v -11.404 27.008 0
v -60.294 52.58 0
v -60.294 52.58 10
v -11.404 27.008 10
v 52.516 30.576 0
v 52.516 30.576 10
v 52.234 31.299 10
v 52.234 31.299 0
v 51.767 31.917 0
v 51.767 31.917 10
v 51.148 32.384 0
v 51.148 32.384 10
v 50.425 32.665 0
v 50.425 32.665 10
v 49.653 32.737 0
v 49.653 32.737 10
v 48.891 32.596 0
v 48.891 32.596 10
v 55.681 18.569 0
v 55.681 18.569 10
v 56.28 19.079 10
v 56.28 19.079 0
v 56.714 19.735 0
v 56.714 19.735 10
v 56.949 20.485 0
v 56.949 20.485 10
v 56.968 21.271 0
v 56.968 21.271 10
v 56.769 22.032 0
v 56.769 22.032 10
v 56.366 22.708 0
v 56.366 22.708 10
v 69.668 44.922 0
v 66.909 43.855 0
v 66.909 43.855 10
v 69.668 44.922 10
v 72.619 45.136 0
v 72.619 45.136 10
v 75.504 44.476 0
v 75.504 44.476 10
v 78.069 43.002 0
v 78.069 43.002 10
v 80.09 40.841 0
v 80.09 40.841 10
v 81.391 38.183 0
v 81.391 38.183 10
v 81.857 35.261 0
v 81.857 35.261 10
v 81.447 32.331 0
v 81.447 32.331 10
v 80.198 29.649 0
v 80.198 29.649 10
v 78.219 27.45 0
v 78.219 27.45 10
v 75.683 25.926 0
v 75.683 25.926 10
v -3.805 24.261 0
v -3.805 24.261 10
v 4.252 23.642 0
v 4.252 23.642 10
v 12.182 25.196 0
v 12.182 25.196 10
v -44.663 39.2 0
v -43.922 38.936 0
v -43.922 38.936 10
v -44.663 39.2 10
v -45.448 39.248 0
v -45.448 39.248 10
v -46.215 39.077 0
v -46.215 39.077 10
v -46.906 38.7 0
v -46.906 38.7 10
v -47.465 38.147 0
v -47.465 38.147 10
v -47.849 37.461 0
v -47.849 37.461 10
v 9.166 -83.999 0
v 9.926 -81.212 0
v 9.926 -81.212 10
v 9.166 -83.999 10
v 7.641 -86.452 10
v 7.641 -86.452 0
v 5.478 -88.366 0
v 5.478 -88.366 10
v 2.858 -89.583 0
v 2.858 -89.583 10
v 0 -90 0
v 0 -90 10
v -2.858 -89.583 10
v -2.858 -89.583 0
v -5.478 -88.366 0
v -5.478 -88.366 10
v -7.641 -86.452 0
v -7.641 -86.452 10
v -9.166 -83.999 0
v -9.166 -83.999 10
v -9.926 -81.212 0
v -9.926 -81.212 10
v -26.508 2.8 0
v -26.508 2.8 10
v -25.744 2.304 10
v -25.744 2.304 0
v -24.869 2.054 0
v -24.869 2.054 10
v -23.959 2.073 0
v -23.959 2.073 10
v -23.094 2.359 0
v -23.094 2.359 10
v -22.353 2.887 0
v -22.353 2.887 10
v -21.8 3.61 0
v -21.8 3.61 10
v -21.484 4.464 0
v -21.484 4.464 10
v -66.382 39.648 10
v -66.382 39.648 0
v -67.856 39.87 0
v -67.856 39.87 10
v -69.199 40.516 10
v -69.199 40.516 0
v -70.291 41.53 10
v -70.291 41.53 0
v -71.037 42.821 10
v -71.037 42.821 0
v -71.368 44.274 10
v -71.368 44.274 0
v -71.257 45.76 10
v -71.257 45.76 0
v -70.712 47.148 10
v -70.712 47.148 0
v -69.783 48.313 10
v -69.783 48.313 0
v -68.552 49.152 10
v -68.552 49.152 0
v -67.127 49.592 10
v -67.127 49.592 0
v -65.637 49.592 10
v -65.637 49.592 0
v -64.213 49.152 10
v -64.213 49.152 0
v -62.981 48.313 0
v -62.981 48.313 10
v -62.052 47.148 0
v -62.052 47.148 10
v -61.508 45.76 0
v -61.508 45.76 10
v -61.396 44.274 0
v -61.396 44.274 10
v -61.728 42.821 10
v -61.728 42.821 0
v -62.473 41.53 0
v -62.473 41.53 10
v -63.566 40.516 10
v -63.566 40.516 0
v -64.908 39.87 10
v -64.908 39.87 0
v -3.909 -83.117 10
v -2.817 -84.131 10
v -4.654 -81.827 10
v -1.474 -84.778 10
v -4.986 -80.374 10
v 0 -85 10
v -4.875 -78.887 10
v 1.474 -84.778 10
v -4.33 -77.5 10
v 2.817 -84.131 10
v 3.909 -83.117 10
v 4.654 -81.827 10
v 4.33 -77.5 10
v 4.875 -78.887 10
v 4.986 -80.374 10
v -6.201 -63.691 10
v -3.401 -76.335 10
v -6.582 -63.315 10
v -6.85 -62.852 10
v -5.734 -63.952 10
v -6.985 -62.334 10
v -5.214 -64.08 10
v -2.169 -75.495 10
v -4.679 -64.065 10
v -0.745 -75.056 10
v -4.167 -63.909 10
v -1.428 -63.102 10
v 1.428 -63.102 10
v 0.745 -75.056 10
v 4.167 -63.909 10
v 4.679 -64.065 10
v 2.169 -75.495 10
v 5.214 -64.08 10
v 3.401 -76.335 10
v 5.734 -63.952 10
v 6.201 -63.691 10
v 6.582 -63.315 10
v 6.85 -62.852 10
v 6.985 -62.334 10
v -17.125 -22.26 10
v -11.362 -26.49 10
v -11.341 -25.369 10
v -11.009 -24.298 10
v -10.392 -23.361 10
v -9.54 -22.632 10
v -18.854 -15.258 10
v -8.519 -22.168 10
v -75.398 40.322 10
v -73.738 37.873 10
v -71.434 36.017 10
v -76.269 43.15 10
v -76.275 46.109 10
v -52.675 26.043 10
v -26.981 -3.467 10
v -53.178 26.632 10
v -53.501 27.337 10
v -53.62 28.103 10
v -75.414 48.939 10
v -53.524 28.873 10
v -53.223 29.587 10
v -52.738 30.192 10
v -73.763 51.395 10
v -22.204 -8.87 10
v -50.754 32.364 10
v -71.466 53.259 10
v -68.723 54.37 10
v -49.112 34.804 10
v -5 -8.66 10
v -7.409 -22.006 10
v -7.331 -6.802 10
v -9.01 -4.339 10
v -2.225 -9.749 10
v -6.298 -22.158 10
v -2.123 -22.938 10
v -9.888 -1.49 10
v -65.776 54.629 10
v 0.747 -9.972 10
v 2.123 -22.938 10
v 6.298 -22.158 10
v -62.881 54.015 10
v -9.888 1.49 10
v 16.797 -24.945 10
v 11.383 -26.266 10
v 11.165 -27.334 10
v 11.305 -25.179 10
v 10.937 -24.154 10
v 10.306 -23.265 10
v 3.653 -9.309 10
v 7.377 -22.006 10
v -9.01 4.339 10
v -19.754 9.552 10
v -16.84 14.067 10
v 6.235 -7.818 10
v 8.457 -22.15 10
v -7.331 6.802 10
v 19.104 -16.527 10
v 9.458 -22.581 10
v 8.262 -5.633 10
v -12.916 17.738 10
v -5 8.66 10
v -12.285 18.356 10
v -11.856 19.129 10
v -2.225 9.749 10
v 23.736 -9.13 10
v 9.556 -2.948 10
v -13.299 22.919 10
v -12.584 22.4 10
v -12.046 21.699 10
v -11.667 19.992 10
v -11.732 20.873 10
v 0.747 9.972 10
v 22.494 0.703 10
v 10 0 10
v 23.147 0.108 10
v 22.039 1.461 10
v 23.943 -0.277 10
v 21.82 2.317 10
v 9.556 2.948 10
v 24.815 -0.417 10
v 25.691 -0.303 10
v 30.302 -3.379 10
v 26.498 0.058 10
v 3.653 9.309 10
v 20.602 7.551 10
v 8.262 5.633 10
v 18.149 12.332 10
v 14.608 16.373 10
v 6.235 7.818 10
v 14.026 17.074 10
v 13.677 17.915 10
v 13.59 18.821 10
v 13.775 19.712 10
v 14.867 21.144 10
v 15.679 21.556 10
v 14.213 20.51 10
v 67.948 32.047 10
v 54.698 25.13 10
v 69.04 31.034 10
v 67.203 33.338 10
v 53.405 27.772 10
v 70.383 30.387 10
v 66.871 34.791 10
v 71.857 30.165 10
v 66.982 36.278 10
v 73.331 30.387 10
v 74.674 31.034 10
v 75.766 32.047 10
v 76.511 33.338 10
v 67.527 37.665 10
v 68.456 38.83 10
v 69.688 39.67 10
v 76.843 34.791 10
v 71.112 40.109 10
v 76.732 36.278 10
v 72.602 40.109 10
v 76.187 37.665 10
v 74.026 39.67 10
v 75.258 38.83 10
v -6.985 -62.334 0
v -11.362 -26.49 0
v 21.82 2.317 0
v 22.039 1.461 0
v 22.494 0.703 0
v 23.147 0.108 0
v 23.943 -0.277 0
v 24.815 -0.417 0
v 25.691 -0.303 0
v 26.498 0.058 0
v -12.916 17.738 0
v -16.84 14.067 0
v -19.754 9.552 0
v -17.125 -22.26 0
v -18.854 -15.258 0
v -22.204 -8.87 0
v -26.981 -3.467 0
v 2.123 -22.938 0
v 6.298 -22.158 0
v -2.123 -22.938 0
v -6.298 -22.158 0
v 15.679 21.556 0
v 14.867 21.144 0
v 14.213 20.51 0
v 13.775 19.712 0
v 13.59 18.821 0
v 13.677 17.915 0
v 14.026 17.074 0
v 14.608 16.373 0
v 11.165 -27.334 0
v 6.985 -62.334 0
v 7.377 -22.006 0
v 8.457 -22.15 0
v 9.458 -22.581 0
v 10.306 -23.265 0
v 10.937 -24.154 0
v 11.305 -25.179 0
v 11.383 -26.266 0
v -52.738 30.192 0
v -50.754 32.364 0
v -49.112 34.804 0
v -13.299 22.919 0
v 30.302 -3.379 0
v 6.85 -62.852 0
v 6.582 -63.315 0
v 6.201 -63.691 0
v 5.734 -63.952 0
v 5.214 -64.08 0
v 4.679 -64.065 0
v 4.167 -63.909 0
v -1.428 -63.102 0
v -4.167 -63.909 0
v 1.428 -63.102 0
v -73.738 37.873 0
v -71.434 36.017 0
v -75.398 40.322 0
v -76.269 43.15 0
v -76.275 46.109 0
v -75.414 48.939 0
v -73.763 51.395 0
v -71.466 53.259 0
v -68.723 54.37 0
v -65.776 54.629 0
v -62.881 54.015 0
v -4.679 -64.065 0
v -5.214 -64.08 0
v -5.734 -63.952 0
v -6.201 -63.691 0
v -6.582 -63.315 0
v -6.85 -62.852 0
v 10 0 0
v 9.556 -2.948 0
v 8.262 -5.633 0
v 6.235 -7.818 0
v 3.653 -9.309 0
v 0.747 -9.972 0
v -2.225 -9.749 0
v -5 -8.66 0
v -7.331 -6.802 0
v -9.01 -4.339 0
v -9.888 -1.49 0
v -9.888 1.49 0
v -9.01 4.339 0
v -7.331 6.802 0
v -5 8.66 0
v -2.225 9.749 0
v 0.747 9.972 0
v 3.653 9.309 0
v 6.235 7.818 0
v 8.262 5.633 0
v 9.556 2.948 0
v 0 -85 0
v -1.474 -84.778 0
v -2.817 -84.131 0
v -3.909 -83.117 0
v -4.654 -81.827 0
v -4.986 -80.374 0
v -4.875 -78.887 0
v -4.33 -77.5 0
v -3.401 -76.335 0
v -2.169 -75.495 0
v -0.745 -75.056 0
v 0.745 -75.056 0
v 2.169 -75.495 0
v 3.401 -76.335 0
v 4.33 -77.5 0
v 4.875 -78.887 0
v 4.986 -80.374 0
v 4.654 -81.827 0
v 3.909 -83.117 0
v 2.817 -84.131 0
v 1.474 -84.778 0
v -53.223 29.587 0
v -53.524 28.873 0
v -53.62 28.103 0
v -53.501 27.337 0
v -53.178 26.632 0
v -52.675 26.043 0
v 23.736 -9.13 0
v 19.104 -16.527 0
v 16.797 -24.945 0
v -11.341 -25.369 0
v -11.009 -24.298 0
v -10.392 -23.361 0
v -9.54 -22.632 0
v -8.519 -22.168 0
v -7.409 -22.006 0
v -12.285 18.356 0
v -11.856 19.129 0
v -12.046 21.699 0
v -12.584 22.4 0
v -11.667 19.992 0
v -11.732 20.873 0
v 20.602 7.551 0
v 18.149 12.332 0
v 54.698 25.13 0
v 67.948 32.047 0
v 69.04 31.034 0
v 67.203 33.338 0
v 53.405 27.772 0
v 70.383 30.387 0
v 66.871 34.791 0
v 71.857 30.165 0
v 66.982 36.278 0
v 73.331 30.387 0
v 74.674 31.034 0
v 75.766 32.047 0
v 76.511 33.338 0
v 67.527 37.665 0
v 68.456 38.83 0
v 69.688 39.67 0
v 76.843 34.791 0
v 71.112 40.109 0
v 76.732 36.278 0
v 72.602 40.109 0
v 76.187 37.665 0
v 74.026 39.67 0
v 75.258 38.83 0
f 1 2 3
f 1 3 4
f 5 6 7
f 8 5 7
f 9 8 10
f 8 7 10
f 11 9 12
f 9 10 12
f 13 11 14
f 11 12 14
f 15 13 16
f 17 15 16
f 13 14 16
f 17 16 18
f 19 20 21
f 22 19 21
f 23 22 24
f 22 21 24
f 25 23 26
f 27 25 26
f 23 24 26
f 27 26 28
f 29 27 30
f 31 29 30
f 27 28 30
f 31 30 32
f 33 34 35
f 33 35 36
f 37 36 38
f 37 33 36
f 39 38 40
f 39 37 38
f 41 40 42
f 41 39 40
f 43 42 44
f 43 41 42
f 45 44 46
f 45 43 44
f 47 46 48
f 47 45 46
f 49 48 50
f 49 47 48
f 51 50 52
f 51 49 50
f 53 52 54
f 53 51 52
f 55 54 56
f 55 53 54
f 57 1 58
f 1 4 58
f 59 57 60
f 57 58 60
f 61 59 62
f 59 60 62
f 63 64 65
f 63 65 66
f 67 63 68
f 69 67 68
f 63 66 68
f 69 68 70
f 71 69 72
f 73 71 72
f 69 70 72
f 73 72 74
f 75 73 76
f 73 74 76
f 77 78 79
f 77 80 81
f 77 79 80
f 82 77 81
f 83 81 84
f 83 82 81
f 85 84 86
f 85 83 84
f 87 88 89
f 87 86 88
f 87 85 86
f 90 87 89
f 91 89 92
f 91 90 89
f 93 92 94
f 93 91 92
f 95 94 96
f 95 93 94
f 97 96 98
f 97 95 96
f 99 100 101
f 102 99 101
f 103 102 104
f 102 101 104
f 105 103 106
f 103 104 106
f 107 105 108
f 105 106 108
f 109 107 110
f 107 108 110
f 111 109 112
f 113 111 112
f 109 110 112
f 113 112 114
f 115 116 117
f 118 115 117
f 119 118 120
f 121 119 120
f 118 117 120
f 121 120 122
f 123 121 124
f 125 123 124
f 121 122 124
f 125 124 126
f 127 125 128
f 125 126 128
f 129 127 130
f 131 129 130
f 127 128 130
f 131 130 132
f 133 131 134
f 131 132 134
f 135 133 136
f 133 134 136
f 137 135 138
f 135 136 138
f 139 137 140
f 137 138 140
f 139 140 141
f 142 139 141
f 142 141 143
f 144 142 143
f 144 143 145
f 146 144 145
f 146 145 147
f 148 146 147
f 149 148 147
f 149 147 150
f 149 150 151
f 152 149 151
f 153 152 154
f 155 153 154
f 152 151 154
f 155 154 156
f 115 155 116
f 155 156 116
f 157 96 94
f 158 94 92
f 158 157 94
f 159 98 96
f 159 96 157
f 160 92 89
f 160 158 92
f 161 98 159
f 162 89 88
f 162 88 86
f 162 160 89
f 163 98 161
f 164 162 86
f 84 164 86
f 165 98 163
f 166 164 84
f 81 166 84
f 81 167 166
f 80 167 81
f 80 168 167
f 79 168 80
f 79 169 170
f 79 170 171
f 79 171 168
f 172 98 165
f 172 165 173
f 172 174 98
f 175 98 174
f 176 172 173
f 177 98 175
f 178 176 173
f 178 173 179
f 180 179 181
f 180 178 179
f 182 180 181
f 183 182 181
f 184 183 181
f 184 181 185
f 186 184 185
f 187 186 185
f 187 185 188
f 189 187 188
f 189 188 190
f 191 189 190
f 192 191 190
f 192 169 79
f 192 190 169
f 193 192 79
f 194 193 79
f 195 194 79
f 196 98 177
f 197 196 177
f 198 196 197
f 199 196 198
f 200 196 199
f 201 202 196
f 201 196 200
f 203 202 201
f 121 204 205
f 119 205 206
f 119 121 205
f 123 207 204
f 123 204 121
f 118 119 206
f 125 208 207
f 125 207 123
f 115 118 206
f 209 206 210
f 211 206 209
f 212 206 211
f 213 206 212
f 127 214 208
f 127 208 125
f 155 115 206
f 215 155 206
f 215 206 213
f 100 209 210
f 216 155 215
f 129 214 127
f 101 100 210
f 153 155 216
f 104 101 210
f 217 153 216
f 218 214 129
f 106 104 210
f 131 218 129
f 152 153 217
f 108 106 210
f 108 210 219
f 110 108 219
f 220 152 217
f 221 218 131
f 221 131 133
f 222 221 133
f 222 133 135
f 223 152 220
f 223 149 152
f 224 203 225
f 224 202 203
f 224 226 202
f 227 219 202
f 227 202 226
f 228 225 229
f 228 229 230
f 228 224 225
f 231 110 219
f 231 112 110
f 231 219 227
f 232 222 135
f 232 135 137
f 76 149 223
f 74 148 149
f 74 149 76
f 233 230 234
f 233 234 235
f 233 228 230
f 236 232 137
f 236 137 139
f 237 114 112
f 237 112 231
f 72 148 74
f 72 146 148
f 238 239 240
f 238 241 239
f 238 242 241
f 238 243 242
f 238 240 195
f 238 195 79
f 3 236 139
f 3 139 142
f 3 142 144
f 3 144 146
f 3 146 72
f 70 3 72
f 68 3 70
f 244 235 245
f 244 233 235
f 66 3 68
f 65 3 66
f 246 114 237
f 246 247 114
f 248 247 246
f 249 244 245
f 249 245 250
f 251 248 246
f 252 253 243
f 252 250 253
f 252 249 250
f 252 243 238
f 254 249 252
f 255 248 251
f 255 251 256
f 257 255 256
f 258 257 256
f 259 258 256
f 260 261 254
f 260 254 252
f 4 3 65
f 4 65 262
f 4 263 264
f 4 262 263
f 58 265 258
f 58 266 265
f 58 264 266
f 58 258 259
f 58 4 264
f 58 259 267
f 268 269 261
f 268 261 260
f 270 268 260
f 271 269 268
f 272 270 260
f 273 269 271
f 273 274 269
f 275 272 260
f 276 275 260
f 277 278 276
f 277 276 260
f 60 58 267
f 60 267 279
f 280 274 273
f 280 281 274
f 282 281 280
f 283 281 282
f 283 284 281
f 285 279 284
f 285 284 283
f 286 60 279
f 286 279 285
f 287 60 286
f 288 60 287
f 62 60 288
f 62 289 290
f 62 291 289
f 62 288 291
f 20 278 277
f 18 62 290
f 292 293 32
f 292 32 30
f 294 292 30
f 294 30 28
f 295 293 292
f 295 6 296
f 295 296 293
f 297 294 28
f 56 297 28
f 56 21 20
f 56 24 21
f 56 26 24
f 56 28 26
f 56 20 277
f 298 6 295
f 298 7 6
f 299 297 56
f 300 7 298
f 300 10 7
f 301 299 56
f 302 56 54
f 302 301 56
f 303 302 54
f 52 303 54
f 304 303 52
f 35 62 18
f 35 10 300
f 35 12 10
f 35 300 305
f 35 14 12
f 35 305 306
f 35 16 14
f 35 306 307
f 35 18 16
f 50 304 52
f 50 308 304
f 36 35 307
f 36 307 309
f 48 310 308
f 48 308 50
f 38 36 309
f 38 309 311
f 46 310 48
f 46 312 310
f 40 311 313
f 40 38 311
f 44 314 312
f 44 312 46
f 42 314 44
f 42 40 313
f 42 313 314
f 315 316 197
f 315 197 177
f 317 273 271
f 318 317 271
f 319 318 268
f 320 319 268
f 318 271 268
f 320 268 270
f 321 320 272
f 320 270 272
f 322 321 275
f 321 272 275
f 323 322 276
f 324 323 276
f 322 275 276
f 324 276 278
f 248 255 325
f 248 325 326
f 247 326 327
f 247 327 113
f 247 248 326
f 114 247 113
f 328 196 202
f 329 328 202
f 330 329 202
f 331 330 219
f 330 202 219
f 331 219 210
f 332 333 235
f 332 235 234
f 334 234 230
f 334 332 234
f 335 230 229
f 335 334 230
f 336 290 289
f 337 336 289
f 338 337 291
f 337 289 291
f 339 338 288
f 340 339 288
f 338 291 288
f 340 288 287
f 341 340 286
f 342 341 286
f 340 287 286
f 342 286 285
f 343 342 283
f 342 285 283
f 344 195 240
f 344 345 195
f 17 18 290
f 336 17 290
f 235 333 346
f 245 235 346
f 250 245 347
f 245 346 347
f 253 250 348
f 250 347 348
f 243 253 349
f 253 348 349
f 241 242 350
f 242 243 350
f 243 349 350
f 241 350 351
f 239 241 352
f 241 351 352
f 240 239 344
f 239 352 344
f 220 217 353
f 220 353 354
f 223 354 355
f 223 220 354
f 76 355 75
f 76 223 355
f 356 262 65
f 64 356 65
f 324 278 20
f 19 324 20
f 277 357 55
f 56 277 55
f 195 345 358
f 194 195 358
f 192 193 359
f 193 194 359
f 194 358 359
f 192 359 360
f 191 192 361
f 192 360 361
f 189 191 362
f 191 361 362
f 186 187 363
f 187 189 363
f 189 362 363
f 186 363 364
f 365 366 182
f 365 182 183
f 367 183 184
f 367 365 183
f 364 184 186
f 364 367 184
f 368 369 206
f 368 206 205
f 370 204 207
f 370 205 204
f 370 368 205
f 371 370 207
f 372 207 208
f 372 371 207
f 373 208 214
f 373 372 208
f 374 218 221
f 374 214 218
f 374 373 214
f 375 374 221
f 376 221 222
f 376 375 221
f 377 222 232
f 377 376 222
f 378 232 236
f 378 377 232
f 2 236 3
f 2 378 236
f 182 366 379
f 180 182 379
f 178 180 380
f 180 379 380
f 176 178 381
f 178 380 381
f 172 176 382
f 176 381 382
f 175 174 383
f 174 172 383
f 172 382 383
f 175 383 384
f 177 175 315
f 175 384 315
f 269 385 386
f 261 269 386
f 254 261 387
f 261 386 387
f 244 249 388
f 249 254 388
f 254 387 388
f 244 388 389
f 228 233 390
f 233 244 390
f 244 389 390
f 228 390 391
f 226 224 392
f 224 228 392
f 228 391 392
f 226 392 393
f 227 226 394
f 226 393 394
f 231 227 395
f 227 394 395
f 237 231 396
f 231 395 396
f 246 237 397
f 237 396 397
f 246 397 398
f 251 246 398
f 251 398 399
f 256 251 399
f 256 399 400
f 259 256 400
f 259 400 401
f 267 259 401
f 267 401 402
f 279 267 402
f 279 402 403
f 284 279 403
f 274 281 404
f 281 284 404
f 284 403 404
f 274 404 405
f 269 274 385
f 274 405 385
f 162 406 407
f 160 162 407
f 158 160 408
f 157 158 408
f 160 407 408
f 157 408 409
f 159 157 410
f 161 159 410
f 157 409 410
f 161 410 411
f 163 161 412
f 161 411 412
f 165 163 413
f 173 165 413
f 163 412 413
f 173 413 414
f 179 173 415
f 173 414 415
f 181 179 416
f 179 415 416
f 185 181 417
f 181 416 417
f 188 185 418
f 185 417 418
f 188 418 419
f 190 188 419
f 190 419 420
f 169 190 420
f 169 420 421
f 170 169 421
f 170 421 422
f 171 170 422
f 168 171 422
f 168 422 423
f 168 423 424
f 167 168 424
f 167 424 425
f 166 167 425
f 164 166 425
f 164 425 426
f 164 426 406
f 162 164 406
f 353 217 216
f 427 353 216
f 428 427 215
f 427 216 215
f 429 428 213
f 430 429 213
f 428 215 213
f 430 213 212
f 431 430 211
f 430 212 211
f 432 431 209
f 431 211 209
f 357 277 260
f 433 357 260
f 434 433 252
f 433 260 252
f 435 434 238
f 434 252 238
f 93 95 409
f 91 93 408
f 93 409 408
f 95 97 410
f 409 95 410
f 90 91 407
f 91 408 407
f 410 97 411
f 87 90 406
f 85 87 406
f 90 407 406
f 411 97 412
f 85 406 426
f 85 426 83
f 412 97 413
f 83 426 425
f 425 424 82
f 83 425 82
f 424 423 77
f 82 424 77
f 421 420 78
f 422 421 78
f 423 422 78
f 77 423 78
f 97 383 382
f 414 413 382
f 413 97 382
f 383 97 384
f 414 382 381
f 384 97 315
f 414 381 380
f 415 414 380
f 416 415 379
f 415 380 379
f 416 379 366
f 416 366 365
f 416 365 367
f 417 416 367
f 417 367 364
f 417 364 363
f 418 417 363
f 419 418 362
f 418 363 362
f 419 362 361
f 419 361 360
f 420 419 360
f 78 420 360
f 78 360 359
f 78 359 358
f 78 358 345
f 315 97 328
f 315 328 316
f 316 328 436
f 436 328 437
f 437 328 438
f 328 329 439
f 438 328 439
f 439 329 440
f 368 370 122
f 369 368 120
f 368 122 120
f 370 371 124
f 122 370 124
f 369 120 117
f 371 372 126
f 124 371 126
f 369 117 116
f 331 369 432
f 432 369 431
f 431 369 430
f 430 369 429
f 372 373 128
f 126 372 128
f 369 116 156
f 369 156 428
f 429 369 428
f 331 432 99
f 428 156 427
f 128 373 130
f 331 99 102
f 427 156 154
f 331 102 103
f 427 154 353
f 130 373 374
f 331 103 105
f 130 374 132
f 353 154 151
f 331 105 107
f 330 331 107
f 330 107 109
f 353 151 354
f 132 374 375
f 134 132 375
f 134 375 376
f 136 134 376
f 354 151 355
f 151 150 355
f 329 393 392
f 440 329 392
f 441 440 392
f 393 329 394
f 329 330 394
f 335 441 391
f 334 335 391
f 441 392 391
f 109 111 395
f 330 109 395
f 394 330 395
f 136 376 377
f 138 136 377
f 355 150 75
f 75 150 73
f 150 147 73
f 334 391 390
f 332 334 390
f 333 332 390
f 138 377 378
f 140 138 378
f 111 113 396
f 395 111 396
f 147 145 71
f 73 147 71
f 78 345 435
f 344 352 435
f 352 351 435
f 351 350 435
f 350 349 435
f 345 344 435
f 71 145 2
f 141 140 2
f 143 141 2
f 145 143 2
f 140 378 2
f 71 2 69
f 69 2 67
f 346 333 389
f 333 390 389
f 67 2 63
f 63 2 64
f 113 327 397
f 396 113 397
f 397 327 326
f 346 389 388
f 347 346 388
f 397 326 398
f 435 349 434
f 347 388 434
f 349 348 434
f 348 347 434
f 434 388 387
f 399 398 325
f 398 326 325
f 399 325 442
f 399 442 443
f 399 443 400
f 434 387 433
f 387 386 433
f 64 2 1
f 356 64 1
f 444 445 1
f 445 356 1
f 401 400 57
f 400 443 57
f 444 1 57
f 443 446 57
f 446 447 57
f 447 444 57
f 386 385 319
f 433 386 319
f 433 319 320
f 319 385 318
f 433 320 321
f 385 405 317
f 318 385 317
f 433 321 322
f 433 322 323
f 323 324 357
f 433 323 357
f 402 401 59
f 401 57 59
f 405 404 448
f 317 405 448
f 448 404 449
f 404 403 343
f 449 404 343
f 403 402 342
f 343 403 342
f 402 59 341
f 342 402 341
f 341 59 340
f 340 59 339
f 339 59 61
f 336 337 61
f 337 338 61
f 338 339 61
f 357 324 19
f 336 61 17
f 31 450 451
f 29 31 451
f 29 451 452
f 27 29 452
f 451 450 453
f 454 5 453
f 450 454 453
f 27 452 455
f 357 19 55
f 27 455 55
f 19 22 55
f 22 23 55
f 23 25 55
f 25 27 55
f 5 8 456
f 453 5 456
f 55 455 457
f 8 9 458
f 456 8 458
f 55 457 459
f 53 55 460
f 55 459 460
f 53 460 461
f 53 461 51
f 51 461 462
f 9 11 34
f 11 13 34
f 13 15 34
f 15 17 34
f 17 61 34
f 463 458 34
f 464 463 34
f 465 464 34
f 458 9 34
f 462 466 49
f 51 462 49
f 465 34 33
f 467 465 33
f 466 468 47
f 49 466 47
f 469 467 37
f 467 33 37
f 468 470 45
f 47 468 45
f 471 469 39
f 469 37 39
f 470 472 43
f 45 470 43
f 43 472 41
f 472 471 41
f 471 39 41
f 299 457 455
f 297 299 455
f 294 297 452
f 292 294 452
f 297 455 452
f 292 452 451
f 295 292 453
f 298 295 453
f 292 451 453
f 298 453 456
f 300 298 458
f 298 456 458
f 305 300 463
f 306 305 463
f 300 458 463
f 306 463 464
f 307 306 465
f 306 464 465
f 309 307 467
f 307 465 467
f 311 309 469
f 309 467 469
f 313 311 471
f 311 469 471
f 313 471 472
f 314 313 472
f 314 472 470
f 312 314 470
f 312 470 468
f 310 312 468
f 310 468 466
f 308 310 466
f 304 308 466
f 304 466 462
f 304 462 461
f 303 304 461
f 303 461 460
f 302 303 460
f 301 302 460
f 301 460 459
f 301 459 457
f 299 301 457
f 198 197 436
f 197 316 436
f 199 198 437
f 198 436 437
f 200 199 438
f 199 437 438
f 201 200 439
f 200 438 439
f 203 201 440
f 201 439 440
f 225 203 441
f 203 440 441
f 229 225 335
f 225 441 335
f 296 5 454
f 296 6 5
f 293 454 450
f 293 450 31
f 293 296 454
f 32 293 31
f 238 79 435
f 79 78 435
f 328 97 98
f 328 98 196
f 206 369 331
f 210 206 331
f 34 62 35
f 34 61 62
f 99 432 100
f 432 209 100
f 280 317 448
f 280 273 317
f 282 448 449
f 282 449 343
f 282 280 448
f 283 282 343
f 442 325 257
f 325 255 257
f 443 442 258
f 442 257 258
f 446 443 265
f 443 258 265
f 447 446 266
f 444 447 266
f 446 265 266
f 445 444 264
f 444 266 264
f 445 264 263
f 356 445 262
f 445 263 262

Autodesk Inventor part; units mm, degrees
ref_plane "YZ Plane" through (0, 0, 0) normal (1, 0, 0) x (0, 1, 0)
ref_plane "XZ Plane" through (0, 0, 0) normal (0, 1, 0) x (-1, 0, 0)
ref_plane "XY Plane" through (0, 0, 0) normal (0, 0, 1) x (1, 0, 0)
sketch "Skizze1" plane through (0, 0, 0) normal (0, 0, 1) x (1, 0, 0)
  line L0 (0, -80) -> (0, 80) construction
  line L1 (0, 0) -> (-126.7494, 85.2494) construction
  line L2 (0, 0) -> (174.2009, 85.2494) construction
  circle A0 centre (0, -80) radius 10
  line L3 (9.9263, -81.2121) -> (18.5, -11)
  line L4 (-9.9263, -81.2121) -> (-18.5, -11)
  arc A1 (11.1647, -27.3337) -> (6.298, -22.158) centre (7.3916, -26.0056) ccw
  arc A2 (-6.298, -22.158) -> (6.298, -22.158) centre (0, 0) ccw
  arc A3 (-6.298, -22.158) -> (-11.3621, -26.4905) centre (-7.3916, -26.0056) ccw
  circle A4 centre (0, 0) radius 10
  circle A5 centre (0, 0) radius 80 construction
  circle A6 centre (-66.3822, 44.6475) radius 10
  line L5 (-71.4336, 36.0171) -> (-18.5, -11)
  line L6 (-60.2936, 52.5803) -> (0, 21.0429)
  circle A7 centre (71.857, 35.1649) radius 10
  line L7 (18.5, -11) -> (75.6826, 25.9257)
  line L8 (0, 21.0429) -> (66.9086, 43.8548)
  line L9 (-11.3621, -26.4905) -> (-6.9853, -62.3337)
  arc A8 (-6.9853, -62.3337) -> (-4.1667, -63.9094) centre (-5, -62.0913) ccw
  arc A9 (4.1667, -63.9094) -> (-4.1667, -63.9094) centre (0, -73) ccw
  arc A10 (4.1667, -63.9094) -> (6.9853, -62.3337) centre (5, -62.0913) ccw
  line L10 (6.9853, -62.3337) -> (11.1647, -27.3337)
  dimension "d4" = 80
  dimension "d7" = 120
  dimension "d8" = 20
  dimension "d10" = 11
  dimension "d11" = 11
  dimension "d12" = 20
  dimension "d17" = 4
  dimension "d21" = 160
  dimension "d31" = 37
  dimension "d32" = 37
  dimension "d35" = 14
  dimension "d39" = 2
  dimension "d40" = 35.8432
  dimension "d41" = 7
  dimension "d43" = 35
  dimension "d71" = 10
  dimension "d77" = 10
extrude "Extrusion2" add sketch "Skizze1" along normal blind 10 contours A0 | A0 L4 L5 A6 L6 L8 A7 L7 L3 | A6 | A7 | L10 A10 A9 A8 L9 A3 A2 A1
sketch "Skizze4" plane through (0, 0, 10) normal (0, 0, 1) x (1, 0, 0)
  arc A0 (-9.9263, -81.2121) -> (9.9263, -81.2121) centre (0, -80) ccw projected
  point P0 (0, 0)
hole "Bohrung1" at (0, -80, 10) direction (0, 0, -1) diameter 10 depth 10
sketch "Skizze5" plane through (0, 0, 10) normal (0, 0, 1) x (1, 0, 0)
  arc A0 (-60.2936, 52.5803) -> (-71.4336, 36.0171) centre (-66.3822, 44.6475) ccw projected
  arc A1 (75.6826, 25.9257) -> (66.9086, 43.8548) centre (71.857, 35.1649) ccw projected
  point P0 (0, 0)
hole "Bohrung2" at (-66.3822, 44.6475, 10) at (71.857, 35.1649, 10) direction (0, 0, -1) diameter 10 depth 10
fillet "Rundung1" radius 30 3 edges at (0, 21.0429, 5) (18.5, -11, 5) (-18.5, -11, 5)
sketch "Skizze6" plane through (0, 0, 10) normal (0, 0, 1) x (1, 0, 0)
  circle A0 centre (-66.3822, 44.6475) radius 5 projected
  line L0 (0, 0) -> (-66.3822, 44.6475) construction
  arc A1 (-12.9165, 17.7381) -> (-21.4837, 4.4641) centre (0, 0) ccw
  circle A2 centre (0, 0) radius 10 projected
  arc A3 (-12.9165, 17.7381) -> (-13.2992, 22.9189) centre (-14.7162, 20.2097) ccw
  line L1 (-13.2992, 22.9189) -> (-43.9218, 38.9365)
  arc A4 (-43.9218, 38.9365) -> (-47.8486, 37.4608) centre (-45.2257, 36.4437) ccw
  arc A5 (-52.7377, 30.1917) -> (-47.8486, 37.4608) centre (-66.3822, 44.6475) ccw
  arc A6 (-52.7377, 30.1917) -> (-52.6749, 26.0427) centre (-50.8067, 28.1459) ccw
  line L2 (-52.6749, 26.0427) -> (-26.5076, 2.8001)
  arc A7 (-26.5076, 2.8001) -> (-21.4837, 4.4641) centre (-24.4772, 5.0861) ccw
  line L3 (-71.4336, 36.0171) -> (-26.9812, -3.4668) projected
  line L4 (-11.4042, 27.008) -> (-60.2936, 52.5803) projected
  dimension "d61" = 10
  dimension "d62" = 5
  dimension "d63" = 5
  dimension "d64" = 18
  dimension "d66" = 25
  dimension "d67" = 35
  dimension "d68" = 5
extrude "Extrusion4" cut sketch "Skizze6" against normal blind 10 contours A1 A7 L2 A6 A5 A4 L1 A3
pattern_circular "Runde Anordnung1" count 2 over 120 about axis through (0, 0, 0) along (0, 0, -1) of "Extrusion4"
extrude "Extrusion5" cut sketch "Skizze1" along normal blind 10 contours L10 A10 A9 A8 L9 A3 A2 A1
equation "\"d32\" = d31"
equation "\"d62\" = 0.5 * d61"
equation "\"d63\" = 0.5 * d61"
properties part number "yoyo" material "Stahl, galvanisiert"
